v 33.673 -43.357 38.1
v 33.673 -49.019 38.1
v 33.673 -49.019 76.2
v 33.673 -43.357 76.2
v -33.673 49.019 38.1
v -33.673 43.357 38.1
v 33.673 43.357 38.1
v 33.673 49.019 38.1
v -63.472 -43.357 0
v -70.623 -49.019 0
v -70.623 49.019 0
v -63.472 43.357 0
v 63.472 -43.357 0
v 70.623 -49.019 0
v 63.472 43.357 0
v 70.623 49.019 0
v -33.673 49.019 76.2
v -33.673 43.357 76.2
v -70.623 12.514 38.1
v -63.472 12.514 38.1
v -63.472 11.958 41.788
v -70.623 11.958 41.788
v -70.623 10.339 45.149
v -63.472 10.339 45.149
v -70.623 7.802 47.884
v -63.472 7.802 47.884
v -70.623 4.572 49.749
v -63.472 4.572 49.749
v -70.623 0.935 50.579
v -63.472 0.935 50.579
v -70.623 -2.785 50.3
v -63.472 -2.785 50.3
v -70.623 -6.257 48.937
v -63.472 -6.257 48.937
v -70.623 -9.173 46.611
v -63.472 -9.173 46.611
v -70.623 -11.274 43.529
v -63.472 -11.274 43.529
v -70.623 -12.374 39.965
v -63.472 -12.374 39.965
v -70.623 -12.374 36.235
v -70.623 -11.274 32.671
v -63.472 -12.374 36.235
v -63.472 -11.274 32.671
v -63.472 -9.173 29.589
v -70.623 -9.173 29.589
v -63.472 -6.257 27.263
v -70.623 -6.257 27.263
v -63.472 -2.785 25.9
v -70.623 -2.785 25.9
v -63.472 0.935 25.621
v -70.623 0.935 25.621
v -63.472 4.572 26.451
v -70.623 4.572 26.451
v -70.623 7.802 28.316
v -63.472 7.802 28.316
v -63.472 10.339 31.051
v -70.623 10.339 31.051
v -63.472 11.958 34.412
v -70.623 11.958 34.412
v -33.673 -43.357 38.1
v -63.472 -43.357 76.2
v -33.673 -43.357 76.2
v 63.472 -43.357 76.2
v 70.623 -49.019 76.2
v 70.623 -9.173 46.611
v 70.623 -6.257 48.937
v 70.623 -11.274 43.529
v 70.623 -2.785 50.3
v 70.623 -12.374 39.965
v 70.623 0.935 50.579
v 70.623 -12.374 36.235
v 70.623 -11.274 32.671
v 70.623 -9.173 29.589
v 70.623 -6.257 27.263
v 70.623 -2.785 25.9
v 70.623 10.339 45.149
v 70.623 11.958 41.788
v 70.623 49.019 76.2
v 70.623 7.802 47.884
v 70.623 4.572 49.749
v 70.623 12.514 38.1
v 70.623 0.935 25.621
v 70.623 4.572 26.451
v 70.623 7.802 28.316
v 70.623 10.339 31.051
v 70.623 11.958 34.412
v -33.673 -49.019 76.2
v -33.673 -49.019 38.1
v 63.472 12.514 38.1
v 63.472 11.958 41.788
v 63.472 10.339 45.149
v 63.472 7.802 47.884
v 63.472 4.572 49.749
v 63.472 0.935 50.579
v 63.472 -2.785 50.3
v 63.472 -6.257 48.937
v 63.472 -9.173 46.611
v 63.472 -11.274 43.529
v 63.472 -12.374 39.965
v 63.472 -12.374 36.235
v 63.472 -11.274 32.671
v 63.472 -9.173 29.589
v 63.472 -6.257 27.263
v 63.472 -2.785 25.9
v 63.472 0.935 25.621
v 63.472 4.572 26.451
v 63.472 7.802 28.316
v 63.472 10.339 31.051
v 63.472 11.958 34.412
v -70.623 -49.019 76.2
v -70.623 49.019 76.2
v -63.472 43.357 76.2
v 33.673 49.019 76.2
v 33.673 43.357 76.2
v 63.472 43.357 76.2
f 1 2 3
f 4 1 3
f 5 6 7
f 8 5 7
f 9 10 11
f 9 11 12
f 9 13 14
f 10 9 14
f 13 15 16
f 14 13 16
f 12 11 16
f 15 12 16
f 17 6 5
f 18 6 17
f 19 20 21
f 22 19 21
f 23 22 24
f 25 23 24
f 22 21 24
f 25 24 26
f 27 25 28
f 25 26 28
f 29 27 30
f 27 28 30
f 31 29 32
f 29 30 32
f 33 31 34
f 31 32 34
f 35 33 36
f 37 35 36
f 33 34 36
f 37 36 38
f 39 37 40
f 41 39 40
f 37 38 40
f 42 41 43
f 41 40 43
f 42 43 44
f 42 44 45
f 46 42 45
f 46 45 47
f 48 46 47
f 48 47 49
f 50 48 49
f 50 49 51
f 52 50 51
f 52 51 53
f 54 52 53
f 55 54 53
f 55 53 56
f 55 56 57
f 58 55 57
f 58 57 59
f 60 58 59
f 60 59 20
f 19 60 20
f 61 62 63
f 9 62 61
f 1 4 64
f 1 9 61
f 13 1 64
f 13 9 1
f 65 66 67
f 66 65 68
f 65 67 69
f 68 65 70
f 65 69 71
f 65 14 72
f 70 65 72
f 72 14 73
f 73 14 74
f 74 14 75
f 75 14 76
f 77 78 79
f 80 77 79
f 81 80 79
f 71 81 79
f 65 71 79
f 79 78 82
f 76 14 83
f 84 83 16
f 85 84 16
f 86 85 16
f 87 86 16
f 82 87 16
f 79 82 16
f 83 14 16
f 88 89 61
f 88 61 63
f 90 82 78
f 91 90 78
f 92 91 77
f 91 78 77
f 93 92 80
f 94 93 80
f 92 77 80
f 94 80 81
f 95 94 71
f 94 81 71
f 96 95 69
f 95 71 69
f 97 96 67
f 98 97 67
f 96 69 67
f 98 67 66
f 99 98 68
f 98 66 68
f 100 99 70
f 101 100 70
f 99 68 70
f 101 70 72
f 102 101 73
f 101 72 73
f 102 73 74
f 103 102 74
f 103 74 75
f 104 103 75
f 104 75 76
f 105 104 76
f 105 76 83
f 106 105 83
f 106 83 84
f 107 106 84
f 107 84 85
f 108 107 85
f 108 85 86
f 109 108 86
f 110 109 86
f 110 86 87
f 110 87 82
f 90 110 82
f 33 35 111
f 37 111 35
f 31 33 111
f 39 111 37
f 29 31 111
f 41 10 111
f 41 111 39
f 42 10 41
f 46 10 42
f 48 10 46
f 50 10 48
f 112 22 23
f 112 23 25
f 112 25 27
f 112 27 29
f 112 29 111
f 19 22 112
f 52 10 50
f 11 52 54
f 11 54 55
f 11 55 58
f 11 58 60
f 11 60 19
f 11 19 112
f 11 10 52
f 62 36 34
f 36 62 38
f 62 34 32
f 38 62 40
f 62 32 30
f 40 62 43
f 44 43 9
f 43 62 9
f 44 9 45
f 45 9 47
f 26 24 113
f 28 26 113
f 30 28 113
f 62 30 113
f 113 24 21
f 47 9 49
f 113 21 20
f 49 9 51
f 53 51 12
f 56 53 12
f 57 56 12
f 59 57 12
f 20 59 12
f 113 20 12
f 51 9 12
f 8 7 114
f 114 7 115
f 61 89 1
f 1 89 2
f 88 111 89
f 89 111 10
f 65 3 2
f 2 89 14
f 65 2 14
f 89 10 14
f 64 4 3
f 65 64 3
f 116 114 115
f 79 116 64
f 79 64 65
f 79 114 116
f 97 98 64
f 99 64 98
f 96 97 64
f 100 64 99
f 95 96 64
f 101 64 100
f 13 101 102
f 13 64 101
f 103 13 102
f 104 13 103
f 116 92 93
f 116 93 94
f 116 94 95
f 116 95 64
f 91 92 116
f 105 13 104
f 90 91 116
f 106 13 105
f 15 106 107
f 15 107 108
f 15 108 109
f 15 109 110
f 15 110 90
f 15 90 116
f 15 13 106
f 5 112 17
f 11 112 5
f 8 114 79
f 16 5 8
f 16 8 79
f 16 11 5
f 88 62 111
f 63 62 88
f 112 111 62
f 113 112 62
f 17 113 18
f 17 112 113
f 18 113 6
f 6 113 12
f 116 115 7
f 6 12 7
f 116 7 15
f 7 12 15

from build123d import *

# Parameters (mm, degrees)
F0_W     = 141.246706
F0_H     = 98.03833
F0_W_2   = 126.943246
F0_H_2   = 86.714752
F1_DEPTH = 76.2
F2_R     = 12.513624
F3_DEPTH = 255.778
F4_W     = 67.345478
F4_H     = 38.1
F5_DEPTH = 172.466


with BuildPart() as f1:
    # F0 (on Top) → F1 (new body)
    with BuildSketch(Plane.XY):
        Rectangle(F0_W, F0_H)
        Rectangle(F0_W_2, F0_H_2, mode=Mode.SUBTRACT)
    extrude(amount=F1_DEPTH)

    # F2 (on face) → F3 (cut)
    with BuildSketch(Plane.YZ.offset(70.623353)):
        with Locations((0, 38.1)):
            Circle(F2_R)
    extrude(amount=-F3_DEPTH, mode=Mode.SUBTRACT)

    # F4 (on face) → F5 (cut)
    with BuildSketch(Plane.XZ.offset(49.019165)):
        with Locations((0, 57.15)):
            Rectangle(F4_W, F4_H)
    extrude(amount=-F5_DEPTH, mode=Mode.SUBTRACT)


solid = f1.part
